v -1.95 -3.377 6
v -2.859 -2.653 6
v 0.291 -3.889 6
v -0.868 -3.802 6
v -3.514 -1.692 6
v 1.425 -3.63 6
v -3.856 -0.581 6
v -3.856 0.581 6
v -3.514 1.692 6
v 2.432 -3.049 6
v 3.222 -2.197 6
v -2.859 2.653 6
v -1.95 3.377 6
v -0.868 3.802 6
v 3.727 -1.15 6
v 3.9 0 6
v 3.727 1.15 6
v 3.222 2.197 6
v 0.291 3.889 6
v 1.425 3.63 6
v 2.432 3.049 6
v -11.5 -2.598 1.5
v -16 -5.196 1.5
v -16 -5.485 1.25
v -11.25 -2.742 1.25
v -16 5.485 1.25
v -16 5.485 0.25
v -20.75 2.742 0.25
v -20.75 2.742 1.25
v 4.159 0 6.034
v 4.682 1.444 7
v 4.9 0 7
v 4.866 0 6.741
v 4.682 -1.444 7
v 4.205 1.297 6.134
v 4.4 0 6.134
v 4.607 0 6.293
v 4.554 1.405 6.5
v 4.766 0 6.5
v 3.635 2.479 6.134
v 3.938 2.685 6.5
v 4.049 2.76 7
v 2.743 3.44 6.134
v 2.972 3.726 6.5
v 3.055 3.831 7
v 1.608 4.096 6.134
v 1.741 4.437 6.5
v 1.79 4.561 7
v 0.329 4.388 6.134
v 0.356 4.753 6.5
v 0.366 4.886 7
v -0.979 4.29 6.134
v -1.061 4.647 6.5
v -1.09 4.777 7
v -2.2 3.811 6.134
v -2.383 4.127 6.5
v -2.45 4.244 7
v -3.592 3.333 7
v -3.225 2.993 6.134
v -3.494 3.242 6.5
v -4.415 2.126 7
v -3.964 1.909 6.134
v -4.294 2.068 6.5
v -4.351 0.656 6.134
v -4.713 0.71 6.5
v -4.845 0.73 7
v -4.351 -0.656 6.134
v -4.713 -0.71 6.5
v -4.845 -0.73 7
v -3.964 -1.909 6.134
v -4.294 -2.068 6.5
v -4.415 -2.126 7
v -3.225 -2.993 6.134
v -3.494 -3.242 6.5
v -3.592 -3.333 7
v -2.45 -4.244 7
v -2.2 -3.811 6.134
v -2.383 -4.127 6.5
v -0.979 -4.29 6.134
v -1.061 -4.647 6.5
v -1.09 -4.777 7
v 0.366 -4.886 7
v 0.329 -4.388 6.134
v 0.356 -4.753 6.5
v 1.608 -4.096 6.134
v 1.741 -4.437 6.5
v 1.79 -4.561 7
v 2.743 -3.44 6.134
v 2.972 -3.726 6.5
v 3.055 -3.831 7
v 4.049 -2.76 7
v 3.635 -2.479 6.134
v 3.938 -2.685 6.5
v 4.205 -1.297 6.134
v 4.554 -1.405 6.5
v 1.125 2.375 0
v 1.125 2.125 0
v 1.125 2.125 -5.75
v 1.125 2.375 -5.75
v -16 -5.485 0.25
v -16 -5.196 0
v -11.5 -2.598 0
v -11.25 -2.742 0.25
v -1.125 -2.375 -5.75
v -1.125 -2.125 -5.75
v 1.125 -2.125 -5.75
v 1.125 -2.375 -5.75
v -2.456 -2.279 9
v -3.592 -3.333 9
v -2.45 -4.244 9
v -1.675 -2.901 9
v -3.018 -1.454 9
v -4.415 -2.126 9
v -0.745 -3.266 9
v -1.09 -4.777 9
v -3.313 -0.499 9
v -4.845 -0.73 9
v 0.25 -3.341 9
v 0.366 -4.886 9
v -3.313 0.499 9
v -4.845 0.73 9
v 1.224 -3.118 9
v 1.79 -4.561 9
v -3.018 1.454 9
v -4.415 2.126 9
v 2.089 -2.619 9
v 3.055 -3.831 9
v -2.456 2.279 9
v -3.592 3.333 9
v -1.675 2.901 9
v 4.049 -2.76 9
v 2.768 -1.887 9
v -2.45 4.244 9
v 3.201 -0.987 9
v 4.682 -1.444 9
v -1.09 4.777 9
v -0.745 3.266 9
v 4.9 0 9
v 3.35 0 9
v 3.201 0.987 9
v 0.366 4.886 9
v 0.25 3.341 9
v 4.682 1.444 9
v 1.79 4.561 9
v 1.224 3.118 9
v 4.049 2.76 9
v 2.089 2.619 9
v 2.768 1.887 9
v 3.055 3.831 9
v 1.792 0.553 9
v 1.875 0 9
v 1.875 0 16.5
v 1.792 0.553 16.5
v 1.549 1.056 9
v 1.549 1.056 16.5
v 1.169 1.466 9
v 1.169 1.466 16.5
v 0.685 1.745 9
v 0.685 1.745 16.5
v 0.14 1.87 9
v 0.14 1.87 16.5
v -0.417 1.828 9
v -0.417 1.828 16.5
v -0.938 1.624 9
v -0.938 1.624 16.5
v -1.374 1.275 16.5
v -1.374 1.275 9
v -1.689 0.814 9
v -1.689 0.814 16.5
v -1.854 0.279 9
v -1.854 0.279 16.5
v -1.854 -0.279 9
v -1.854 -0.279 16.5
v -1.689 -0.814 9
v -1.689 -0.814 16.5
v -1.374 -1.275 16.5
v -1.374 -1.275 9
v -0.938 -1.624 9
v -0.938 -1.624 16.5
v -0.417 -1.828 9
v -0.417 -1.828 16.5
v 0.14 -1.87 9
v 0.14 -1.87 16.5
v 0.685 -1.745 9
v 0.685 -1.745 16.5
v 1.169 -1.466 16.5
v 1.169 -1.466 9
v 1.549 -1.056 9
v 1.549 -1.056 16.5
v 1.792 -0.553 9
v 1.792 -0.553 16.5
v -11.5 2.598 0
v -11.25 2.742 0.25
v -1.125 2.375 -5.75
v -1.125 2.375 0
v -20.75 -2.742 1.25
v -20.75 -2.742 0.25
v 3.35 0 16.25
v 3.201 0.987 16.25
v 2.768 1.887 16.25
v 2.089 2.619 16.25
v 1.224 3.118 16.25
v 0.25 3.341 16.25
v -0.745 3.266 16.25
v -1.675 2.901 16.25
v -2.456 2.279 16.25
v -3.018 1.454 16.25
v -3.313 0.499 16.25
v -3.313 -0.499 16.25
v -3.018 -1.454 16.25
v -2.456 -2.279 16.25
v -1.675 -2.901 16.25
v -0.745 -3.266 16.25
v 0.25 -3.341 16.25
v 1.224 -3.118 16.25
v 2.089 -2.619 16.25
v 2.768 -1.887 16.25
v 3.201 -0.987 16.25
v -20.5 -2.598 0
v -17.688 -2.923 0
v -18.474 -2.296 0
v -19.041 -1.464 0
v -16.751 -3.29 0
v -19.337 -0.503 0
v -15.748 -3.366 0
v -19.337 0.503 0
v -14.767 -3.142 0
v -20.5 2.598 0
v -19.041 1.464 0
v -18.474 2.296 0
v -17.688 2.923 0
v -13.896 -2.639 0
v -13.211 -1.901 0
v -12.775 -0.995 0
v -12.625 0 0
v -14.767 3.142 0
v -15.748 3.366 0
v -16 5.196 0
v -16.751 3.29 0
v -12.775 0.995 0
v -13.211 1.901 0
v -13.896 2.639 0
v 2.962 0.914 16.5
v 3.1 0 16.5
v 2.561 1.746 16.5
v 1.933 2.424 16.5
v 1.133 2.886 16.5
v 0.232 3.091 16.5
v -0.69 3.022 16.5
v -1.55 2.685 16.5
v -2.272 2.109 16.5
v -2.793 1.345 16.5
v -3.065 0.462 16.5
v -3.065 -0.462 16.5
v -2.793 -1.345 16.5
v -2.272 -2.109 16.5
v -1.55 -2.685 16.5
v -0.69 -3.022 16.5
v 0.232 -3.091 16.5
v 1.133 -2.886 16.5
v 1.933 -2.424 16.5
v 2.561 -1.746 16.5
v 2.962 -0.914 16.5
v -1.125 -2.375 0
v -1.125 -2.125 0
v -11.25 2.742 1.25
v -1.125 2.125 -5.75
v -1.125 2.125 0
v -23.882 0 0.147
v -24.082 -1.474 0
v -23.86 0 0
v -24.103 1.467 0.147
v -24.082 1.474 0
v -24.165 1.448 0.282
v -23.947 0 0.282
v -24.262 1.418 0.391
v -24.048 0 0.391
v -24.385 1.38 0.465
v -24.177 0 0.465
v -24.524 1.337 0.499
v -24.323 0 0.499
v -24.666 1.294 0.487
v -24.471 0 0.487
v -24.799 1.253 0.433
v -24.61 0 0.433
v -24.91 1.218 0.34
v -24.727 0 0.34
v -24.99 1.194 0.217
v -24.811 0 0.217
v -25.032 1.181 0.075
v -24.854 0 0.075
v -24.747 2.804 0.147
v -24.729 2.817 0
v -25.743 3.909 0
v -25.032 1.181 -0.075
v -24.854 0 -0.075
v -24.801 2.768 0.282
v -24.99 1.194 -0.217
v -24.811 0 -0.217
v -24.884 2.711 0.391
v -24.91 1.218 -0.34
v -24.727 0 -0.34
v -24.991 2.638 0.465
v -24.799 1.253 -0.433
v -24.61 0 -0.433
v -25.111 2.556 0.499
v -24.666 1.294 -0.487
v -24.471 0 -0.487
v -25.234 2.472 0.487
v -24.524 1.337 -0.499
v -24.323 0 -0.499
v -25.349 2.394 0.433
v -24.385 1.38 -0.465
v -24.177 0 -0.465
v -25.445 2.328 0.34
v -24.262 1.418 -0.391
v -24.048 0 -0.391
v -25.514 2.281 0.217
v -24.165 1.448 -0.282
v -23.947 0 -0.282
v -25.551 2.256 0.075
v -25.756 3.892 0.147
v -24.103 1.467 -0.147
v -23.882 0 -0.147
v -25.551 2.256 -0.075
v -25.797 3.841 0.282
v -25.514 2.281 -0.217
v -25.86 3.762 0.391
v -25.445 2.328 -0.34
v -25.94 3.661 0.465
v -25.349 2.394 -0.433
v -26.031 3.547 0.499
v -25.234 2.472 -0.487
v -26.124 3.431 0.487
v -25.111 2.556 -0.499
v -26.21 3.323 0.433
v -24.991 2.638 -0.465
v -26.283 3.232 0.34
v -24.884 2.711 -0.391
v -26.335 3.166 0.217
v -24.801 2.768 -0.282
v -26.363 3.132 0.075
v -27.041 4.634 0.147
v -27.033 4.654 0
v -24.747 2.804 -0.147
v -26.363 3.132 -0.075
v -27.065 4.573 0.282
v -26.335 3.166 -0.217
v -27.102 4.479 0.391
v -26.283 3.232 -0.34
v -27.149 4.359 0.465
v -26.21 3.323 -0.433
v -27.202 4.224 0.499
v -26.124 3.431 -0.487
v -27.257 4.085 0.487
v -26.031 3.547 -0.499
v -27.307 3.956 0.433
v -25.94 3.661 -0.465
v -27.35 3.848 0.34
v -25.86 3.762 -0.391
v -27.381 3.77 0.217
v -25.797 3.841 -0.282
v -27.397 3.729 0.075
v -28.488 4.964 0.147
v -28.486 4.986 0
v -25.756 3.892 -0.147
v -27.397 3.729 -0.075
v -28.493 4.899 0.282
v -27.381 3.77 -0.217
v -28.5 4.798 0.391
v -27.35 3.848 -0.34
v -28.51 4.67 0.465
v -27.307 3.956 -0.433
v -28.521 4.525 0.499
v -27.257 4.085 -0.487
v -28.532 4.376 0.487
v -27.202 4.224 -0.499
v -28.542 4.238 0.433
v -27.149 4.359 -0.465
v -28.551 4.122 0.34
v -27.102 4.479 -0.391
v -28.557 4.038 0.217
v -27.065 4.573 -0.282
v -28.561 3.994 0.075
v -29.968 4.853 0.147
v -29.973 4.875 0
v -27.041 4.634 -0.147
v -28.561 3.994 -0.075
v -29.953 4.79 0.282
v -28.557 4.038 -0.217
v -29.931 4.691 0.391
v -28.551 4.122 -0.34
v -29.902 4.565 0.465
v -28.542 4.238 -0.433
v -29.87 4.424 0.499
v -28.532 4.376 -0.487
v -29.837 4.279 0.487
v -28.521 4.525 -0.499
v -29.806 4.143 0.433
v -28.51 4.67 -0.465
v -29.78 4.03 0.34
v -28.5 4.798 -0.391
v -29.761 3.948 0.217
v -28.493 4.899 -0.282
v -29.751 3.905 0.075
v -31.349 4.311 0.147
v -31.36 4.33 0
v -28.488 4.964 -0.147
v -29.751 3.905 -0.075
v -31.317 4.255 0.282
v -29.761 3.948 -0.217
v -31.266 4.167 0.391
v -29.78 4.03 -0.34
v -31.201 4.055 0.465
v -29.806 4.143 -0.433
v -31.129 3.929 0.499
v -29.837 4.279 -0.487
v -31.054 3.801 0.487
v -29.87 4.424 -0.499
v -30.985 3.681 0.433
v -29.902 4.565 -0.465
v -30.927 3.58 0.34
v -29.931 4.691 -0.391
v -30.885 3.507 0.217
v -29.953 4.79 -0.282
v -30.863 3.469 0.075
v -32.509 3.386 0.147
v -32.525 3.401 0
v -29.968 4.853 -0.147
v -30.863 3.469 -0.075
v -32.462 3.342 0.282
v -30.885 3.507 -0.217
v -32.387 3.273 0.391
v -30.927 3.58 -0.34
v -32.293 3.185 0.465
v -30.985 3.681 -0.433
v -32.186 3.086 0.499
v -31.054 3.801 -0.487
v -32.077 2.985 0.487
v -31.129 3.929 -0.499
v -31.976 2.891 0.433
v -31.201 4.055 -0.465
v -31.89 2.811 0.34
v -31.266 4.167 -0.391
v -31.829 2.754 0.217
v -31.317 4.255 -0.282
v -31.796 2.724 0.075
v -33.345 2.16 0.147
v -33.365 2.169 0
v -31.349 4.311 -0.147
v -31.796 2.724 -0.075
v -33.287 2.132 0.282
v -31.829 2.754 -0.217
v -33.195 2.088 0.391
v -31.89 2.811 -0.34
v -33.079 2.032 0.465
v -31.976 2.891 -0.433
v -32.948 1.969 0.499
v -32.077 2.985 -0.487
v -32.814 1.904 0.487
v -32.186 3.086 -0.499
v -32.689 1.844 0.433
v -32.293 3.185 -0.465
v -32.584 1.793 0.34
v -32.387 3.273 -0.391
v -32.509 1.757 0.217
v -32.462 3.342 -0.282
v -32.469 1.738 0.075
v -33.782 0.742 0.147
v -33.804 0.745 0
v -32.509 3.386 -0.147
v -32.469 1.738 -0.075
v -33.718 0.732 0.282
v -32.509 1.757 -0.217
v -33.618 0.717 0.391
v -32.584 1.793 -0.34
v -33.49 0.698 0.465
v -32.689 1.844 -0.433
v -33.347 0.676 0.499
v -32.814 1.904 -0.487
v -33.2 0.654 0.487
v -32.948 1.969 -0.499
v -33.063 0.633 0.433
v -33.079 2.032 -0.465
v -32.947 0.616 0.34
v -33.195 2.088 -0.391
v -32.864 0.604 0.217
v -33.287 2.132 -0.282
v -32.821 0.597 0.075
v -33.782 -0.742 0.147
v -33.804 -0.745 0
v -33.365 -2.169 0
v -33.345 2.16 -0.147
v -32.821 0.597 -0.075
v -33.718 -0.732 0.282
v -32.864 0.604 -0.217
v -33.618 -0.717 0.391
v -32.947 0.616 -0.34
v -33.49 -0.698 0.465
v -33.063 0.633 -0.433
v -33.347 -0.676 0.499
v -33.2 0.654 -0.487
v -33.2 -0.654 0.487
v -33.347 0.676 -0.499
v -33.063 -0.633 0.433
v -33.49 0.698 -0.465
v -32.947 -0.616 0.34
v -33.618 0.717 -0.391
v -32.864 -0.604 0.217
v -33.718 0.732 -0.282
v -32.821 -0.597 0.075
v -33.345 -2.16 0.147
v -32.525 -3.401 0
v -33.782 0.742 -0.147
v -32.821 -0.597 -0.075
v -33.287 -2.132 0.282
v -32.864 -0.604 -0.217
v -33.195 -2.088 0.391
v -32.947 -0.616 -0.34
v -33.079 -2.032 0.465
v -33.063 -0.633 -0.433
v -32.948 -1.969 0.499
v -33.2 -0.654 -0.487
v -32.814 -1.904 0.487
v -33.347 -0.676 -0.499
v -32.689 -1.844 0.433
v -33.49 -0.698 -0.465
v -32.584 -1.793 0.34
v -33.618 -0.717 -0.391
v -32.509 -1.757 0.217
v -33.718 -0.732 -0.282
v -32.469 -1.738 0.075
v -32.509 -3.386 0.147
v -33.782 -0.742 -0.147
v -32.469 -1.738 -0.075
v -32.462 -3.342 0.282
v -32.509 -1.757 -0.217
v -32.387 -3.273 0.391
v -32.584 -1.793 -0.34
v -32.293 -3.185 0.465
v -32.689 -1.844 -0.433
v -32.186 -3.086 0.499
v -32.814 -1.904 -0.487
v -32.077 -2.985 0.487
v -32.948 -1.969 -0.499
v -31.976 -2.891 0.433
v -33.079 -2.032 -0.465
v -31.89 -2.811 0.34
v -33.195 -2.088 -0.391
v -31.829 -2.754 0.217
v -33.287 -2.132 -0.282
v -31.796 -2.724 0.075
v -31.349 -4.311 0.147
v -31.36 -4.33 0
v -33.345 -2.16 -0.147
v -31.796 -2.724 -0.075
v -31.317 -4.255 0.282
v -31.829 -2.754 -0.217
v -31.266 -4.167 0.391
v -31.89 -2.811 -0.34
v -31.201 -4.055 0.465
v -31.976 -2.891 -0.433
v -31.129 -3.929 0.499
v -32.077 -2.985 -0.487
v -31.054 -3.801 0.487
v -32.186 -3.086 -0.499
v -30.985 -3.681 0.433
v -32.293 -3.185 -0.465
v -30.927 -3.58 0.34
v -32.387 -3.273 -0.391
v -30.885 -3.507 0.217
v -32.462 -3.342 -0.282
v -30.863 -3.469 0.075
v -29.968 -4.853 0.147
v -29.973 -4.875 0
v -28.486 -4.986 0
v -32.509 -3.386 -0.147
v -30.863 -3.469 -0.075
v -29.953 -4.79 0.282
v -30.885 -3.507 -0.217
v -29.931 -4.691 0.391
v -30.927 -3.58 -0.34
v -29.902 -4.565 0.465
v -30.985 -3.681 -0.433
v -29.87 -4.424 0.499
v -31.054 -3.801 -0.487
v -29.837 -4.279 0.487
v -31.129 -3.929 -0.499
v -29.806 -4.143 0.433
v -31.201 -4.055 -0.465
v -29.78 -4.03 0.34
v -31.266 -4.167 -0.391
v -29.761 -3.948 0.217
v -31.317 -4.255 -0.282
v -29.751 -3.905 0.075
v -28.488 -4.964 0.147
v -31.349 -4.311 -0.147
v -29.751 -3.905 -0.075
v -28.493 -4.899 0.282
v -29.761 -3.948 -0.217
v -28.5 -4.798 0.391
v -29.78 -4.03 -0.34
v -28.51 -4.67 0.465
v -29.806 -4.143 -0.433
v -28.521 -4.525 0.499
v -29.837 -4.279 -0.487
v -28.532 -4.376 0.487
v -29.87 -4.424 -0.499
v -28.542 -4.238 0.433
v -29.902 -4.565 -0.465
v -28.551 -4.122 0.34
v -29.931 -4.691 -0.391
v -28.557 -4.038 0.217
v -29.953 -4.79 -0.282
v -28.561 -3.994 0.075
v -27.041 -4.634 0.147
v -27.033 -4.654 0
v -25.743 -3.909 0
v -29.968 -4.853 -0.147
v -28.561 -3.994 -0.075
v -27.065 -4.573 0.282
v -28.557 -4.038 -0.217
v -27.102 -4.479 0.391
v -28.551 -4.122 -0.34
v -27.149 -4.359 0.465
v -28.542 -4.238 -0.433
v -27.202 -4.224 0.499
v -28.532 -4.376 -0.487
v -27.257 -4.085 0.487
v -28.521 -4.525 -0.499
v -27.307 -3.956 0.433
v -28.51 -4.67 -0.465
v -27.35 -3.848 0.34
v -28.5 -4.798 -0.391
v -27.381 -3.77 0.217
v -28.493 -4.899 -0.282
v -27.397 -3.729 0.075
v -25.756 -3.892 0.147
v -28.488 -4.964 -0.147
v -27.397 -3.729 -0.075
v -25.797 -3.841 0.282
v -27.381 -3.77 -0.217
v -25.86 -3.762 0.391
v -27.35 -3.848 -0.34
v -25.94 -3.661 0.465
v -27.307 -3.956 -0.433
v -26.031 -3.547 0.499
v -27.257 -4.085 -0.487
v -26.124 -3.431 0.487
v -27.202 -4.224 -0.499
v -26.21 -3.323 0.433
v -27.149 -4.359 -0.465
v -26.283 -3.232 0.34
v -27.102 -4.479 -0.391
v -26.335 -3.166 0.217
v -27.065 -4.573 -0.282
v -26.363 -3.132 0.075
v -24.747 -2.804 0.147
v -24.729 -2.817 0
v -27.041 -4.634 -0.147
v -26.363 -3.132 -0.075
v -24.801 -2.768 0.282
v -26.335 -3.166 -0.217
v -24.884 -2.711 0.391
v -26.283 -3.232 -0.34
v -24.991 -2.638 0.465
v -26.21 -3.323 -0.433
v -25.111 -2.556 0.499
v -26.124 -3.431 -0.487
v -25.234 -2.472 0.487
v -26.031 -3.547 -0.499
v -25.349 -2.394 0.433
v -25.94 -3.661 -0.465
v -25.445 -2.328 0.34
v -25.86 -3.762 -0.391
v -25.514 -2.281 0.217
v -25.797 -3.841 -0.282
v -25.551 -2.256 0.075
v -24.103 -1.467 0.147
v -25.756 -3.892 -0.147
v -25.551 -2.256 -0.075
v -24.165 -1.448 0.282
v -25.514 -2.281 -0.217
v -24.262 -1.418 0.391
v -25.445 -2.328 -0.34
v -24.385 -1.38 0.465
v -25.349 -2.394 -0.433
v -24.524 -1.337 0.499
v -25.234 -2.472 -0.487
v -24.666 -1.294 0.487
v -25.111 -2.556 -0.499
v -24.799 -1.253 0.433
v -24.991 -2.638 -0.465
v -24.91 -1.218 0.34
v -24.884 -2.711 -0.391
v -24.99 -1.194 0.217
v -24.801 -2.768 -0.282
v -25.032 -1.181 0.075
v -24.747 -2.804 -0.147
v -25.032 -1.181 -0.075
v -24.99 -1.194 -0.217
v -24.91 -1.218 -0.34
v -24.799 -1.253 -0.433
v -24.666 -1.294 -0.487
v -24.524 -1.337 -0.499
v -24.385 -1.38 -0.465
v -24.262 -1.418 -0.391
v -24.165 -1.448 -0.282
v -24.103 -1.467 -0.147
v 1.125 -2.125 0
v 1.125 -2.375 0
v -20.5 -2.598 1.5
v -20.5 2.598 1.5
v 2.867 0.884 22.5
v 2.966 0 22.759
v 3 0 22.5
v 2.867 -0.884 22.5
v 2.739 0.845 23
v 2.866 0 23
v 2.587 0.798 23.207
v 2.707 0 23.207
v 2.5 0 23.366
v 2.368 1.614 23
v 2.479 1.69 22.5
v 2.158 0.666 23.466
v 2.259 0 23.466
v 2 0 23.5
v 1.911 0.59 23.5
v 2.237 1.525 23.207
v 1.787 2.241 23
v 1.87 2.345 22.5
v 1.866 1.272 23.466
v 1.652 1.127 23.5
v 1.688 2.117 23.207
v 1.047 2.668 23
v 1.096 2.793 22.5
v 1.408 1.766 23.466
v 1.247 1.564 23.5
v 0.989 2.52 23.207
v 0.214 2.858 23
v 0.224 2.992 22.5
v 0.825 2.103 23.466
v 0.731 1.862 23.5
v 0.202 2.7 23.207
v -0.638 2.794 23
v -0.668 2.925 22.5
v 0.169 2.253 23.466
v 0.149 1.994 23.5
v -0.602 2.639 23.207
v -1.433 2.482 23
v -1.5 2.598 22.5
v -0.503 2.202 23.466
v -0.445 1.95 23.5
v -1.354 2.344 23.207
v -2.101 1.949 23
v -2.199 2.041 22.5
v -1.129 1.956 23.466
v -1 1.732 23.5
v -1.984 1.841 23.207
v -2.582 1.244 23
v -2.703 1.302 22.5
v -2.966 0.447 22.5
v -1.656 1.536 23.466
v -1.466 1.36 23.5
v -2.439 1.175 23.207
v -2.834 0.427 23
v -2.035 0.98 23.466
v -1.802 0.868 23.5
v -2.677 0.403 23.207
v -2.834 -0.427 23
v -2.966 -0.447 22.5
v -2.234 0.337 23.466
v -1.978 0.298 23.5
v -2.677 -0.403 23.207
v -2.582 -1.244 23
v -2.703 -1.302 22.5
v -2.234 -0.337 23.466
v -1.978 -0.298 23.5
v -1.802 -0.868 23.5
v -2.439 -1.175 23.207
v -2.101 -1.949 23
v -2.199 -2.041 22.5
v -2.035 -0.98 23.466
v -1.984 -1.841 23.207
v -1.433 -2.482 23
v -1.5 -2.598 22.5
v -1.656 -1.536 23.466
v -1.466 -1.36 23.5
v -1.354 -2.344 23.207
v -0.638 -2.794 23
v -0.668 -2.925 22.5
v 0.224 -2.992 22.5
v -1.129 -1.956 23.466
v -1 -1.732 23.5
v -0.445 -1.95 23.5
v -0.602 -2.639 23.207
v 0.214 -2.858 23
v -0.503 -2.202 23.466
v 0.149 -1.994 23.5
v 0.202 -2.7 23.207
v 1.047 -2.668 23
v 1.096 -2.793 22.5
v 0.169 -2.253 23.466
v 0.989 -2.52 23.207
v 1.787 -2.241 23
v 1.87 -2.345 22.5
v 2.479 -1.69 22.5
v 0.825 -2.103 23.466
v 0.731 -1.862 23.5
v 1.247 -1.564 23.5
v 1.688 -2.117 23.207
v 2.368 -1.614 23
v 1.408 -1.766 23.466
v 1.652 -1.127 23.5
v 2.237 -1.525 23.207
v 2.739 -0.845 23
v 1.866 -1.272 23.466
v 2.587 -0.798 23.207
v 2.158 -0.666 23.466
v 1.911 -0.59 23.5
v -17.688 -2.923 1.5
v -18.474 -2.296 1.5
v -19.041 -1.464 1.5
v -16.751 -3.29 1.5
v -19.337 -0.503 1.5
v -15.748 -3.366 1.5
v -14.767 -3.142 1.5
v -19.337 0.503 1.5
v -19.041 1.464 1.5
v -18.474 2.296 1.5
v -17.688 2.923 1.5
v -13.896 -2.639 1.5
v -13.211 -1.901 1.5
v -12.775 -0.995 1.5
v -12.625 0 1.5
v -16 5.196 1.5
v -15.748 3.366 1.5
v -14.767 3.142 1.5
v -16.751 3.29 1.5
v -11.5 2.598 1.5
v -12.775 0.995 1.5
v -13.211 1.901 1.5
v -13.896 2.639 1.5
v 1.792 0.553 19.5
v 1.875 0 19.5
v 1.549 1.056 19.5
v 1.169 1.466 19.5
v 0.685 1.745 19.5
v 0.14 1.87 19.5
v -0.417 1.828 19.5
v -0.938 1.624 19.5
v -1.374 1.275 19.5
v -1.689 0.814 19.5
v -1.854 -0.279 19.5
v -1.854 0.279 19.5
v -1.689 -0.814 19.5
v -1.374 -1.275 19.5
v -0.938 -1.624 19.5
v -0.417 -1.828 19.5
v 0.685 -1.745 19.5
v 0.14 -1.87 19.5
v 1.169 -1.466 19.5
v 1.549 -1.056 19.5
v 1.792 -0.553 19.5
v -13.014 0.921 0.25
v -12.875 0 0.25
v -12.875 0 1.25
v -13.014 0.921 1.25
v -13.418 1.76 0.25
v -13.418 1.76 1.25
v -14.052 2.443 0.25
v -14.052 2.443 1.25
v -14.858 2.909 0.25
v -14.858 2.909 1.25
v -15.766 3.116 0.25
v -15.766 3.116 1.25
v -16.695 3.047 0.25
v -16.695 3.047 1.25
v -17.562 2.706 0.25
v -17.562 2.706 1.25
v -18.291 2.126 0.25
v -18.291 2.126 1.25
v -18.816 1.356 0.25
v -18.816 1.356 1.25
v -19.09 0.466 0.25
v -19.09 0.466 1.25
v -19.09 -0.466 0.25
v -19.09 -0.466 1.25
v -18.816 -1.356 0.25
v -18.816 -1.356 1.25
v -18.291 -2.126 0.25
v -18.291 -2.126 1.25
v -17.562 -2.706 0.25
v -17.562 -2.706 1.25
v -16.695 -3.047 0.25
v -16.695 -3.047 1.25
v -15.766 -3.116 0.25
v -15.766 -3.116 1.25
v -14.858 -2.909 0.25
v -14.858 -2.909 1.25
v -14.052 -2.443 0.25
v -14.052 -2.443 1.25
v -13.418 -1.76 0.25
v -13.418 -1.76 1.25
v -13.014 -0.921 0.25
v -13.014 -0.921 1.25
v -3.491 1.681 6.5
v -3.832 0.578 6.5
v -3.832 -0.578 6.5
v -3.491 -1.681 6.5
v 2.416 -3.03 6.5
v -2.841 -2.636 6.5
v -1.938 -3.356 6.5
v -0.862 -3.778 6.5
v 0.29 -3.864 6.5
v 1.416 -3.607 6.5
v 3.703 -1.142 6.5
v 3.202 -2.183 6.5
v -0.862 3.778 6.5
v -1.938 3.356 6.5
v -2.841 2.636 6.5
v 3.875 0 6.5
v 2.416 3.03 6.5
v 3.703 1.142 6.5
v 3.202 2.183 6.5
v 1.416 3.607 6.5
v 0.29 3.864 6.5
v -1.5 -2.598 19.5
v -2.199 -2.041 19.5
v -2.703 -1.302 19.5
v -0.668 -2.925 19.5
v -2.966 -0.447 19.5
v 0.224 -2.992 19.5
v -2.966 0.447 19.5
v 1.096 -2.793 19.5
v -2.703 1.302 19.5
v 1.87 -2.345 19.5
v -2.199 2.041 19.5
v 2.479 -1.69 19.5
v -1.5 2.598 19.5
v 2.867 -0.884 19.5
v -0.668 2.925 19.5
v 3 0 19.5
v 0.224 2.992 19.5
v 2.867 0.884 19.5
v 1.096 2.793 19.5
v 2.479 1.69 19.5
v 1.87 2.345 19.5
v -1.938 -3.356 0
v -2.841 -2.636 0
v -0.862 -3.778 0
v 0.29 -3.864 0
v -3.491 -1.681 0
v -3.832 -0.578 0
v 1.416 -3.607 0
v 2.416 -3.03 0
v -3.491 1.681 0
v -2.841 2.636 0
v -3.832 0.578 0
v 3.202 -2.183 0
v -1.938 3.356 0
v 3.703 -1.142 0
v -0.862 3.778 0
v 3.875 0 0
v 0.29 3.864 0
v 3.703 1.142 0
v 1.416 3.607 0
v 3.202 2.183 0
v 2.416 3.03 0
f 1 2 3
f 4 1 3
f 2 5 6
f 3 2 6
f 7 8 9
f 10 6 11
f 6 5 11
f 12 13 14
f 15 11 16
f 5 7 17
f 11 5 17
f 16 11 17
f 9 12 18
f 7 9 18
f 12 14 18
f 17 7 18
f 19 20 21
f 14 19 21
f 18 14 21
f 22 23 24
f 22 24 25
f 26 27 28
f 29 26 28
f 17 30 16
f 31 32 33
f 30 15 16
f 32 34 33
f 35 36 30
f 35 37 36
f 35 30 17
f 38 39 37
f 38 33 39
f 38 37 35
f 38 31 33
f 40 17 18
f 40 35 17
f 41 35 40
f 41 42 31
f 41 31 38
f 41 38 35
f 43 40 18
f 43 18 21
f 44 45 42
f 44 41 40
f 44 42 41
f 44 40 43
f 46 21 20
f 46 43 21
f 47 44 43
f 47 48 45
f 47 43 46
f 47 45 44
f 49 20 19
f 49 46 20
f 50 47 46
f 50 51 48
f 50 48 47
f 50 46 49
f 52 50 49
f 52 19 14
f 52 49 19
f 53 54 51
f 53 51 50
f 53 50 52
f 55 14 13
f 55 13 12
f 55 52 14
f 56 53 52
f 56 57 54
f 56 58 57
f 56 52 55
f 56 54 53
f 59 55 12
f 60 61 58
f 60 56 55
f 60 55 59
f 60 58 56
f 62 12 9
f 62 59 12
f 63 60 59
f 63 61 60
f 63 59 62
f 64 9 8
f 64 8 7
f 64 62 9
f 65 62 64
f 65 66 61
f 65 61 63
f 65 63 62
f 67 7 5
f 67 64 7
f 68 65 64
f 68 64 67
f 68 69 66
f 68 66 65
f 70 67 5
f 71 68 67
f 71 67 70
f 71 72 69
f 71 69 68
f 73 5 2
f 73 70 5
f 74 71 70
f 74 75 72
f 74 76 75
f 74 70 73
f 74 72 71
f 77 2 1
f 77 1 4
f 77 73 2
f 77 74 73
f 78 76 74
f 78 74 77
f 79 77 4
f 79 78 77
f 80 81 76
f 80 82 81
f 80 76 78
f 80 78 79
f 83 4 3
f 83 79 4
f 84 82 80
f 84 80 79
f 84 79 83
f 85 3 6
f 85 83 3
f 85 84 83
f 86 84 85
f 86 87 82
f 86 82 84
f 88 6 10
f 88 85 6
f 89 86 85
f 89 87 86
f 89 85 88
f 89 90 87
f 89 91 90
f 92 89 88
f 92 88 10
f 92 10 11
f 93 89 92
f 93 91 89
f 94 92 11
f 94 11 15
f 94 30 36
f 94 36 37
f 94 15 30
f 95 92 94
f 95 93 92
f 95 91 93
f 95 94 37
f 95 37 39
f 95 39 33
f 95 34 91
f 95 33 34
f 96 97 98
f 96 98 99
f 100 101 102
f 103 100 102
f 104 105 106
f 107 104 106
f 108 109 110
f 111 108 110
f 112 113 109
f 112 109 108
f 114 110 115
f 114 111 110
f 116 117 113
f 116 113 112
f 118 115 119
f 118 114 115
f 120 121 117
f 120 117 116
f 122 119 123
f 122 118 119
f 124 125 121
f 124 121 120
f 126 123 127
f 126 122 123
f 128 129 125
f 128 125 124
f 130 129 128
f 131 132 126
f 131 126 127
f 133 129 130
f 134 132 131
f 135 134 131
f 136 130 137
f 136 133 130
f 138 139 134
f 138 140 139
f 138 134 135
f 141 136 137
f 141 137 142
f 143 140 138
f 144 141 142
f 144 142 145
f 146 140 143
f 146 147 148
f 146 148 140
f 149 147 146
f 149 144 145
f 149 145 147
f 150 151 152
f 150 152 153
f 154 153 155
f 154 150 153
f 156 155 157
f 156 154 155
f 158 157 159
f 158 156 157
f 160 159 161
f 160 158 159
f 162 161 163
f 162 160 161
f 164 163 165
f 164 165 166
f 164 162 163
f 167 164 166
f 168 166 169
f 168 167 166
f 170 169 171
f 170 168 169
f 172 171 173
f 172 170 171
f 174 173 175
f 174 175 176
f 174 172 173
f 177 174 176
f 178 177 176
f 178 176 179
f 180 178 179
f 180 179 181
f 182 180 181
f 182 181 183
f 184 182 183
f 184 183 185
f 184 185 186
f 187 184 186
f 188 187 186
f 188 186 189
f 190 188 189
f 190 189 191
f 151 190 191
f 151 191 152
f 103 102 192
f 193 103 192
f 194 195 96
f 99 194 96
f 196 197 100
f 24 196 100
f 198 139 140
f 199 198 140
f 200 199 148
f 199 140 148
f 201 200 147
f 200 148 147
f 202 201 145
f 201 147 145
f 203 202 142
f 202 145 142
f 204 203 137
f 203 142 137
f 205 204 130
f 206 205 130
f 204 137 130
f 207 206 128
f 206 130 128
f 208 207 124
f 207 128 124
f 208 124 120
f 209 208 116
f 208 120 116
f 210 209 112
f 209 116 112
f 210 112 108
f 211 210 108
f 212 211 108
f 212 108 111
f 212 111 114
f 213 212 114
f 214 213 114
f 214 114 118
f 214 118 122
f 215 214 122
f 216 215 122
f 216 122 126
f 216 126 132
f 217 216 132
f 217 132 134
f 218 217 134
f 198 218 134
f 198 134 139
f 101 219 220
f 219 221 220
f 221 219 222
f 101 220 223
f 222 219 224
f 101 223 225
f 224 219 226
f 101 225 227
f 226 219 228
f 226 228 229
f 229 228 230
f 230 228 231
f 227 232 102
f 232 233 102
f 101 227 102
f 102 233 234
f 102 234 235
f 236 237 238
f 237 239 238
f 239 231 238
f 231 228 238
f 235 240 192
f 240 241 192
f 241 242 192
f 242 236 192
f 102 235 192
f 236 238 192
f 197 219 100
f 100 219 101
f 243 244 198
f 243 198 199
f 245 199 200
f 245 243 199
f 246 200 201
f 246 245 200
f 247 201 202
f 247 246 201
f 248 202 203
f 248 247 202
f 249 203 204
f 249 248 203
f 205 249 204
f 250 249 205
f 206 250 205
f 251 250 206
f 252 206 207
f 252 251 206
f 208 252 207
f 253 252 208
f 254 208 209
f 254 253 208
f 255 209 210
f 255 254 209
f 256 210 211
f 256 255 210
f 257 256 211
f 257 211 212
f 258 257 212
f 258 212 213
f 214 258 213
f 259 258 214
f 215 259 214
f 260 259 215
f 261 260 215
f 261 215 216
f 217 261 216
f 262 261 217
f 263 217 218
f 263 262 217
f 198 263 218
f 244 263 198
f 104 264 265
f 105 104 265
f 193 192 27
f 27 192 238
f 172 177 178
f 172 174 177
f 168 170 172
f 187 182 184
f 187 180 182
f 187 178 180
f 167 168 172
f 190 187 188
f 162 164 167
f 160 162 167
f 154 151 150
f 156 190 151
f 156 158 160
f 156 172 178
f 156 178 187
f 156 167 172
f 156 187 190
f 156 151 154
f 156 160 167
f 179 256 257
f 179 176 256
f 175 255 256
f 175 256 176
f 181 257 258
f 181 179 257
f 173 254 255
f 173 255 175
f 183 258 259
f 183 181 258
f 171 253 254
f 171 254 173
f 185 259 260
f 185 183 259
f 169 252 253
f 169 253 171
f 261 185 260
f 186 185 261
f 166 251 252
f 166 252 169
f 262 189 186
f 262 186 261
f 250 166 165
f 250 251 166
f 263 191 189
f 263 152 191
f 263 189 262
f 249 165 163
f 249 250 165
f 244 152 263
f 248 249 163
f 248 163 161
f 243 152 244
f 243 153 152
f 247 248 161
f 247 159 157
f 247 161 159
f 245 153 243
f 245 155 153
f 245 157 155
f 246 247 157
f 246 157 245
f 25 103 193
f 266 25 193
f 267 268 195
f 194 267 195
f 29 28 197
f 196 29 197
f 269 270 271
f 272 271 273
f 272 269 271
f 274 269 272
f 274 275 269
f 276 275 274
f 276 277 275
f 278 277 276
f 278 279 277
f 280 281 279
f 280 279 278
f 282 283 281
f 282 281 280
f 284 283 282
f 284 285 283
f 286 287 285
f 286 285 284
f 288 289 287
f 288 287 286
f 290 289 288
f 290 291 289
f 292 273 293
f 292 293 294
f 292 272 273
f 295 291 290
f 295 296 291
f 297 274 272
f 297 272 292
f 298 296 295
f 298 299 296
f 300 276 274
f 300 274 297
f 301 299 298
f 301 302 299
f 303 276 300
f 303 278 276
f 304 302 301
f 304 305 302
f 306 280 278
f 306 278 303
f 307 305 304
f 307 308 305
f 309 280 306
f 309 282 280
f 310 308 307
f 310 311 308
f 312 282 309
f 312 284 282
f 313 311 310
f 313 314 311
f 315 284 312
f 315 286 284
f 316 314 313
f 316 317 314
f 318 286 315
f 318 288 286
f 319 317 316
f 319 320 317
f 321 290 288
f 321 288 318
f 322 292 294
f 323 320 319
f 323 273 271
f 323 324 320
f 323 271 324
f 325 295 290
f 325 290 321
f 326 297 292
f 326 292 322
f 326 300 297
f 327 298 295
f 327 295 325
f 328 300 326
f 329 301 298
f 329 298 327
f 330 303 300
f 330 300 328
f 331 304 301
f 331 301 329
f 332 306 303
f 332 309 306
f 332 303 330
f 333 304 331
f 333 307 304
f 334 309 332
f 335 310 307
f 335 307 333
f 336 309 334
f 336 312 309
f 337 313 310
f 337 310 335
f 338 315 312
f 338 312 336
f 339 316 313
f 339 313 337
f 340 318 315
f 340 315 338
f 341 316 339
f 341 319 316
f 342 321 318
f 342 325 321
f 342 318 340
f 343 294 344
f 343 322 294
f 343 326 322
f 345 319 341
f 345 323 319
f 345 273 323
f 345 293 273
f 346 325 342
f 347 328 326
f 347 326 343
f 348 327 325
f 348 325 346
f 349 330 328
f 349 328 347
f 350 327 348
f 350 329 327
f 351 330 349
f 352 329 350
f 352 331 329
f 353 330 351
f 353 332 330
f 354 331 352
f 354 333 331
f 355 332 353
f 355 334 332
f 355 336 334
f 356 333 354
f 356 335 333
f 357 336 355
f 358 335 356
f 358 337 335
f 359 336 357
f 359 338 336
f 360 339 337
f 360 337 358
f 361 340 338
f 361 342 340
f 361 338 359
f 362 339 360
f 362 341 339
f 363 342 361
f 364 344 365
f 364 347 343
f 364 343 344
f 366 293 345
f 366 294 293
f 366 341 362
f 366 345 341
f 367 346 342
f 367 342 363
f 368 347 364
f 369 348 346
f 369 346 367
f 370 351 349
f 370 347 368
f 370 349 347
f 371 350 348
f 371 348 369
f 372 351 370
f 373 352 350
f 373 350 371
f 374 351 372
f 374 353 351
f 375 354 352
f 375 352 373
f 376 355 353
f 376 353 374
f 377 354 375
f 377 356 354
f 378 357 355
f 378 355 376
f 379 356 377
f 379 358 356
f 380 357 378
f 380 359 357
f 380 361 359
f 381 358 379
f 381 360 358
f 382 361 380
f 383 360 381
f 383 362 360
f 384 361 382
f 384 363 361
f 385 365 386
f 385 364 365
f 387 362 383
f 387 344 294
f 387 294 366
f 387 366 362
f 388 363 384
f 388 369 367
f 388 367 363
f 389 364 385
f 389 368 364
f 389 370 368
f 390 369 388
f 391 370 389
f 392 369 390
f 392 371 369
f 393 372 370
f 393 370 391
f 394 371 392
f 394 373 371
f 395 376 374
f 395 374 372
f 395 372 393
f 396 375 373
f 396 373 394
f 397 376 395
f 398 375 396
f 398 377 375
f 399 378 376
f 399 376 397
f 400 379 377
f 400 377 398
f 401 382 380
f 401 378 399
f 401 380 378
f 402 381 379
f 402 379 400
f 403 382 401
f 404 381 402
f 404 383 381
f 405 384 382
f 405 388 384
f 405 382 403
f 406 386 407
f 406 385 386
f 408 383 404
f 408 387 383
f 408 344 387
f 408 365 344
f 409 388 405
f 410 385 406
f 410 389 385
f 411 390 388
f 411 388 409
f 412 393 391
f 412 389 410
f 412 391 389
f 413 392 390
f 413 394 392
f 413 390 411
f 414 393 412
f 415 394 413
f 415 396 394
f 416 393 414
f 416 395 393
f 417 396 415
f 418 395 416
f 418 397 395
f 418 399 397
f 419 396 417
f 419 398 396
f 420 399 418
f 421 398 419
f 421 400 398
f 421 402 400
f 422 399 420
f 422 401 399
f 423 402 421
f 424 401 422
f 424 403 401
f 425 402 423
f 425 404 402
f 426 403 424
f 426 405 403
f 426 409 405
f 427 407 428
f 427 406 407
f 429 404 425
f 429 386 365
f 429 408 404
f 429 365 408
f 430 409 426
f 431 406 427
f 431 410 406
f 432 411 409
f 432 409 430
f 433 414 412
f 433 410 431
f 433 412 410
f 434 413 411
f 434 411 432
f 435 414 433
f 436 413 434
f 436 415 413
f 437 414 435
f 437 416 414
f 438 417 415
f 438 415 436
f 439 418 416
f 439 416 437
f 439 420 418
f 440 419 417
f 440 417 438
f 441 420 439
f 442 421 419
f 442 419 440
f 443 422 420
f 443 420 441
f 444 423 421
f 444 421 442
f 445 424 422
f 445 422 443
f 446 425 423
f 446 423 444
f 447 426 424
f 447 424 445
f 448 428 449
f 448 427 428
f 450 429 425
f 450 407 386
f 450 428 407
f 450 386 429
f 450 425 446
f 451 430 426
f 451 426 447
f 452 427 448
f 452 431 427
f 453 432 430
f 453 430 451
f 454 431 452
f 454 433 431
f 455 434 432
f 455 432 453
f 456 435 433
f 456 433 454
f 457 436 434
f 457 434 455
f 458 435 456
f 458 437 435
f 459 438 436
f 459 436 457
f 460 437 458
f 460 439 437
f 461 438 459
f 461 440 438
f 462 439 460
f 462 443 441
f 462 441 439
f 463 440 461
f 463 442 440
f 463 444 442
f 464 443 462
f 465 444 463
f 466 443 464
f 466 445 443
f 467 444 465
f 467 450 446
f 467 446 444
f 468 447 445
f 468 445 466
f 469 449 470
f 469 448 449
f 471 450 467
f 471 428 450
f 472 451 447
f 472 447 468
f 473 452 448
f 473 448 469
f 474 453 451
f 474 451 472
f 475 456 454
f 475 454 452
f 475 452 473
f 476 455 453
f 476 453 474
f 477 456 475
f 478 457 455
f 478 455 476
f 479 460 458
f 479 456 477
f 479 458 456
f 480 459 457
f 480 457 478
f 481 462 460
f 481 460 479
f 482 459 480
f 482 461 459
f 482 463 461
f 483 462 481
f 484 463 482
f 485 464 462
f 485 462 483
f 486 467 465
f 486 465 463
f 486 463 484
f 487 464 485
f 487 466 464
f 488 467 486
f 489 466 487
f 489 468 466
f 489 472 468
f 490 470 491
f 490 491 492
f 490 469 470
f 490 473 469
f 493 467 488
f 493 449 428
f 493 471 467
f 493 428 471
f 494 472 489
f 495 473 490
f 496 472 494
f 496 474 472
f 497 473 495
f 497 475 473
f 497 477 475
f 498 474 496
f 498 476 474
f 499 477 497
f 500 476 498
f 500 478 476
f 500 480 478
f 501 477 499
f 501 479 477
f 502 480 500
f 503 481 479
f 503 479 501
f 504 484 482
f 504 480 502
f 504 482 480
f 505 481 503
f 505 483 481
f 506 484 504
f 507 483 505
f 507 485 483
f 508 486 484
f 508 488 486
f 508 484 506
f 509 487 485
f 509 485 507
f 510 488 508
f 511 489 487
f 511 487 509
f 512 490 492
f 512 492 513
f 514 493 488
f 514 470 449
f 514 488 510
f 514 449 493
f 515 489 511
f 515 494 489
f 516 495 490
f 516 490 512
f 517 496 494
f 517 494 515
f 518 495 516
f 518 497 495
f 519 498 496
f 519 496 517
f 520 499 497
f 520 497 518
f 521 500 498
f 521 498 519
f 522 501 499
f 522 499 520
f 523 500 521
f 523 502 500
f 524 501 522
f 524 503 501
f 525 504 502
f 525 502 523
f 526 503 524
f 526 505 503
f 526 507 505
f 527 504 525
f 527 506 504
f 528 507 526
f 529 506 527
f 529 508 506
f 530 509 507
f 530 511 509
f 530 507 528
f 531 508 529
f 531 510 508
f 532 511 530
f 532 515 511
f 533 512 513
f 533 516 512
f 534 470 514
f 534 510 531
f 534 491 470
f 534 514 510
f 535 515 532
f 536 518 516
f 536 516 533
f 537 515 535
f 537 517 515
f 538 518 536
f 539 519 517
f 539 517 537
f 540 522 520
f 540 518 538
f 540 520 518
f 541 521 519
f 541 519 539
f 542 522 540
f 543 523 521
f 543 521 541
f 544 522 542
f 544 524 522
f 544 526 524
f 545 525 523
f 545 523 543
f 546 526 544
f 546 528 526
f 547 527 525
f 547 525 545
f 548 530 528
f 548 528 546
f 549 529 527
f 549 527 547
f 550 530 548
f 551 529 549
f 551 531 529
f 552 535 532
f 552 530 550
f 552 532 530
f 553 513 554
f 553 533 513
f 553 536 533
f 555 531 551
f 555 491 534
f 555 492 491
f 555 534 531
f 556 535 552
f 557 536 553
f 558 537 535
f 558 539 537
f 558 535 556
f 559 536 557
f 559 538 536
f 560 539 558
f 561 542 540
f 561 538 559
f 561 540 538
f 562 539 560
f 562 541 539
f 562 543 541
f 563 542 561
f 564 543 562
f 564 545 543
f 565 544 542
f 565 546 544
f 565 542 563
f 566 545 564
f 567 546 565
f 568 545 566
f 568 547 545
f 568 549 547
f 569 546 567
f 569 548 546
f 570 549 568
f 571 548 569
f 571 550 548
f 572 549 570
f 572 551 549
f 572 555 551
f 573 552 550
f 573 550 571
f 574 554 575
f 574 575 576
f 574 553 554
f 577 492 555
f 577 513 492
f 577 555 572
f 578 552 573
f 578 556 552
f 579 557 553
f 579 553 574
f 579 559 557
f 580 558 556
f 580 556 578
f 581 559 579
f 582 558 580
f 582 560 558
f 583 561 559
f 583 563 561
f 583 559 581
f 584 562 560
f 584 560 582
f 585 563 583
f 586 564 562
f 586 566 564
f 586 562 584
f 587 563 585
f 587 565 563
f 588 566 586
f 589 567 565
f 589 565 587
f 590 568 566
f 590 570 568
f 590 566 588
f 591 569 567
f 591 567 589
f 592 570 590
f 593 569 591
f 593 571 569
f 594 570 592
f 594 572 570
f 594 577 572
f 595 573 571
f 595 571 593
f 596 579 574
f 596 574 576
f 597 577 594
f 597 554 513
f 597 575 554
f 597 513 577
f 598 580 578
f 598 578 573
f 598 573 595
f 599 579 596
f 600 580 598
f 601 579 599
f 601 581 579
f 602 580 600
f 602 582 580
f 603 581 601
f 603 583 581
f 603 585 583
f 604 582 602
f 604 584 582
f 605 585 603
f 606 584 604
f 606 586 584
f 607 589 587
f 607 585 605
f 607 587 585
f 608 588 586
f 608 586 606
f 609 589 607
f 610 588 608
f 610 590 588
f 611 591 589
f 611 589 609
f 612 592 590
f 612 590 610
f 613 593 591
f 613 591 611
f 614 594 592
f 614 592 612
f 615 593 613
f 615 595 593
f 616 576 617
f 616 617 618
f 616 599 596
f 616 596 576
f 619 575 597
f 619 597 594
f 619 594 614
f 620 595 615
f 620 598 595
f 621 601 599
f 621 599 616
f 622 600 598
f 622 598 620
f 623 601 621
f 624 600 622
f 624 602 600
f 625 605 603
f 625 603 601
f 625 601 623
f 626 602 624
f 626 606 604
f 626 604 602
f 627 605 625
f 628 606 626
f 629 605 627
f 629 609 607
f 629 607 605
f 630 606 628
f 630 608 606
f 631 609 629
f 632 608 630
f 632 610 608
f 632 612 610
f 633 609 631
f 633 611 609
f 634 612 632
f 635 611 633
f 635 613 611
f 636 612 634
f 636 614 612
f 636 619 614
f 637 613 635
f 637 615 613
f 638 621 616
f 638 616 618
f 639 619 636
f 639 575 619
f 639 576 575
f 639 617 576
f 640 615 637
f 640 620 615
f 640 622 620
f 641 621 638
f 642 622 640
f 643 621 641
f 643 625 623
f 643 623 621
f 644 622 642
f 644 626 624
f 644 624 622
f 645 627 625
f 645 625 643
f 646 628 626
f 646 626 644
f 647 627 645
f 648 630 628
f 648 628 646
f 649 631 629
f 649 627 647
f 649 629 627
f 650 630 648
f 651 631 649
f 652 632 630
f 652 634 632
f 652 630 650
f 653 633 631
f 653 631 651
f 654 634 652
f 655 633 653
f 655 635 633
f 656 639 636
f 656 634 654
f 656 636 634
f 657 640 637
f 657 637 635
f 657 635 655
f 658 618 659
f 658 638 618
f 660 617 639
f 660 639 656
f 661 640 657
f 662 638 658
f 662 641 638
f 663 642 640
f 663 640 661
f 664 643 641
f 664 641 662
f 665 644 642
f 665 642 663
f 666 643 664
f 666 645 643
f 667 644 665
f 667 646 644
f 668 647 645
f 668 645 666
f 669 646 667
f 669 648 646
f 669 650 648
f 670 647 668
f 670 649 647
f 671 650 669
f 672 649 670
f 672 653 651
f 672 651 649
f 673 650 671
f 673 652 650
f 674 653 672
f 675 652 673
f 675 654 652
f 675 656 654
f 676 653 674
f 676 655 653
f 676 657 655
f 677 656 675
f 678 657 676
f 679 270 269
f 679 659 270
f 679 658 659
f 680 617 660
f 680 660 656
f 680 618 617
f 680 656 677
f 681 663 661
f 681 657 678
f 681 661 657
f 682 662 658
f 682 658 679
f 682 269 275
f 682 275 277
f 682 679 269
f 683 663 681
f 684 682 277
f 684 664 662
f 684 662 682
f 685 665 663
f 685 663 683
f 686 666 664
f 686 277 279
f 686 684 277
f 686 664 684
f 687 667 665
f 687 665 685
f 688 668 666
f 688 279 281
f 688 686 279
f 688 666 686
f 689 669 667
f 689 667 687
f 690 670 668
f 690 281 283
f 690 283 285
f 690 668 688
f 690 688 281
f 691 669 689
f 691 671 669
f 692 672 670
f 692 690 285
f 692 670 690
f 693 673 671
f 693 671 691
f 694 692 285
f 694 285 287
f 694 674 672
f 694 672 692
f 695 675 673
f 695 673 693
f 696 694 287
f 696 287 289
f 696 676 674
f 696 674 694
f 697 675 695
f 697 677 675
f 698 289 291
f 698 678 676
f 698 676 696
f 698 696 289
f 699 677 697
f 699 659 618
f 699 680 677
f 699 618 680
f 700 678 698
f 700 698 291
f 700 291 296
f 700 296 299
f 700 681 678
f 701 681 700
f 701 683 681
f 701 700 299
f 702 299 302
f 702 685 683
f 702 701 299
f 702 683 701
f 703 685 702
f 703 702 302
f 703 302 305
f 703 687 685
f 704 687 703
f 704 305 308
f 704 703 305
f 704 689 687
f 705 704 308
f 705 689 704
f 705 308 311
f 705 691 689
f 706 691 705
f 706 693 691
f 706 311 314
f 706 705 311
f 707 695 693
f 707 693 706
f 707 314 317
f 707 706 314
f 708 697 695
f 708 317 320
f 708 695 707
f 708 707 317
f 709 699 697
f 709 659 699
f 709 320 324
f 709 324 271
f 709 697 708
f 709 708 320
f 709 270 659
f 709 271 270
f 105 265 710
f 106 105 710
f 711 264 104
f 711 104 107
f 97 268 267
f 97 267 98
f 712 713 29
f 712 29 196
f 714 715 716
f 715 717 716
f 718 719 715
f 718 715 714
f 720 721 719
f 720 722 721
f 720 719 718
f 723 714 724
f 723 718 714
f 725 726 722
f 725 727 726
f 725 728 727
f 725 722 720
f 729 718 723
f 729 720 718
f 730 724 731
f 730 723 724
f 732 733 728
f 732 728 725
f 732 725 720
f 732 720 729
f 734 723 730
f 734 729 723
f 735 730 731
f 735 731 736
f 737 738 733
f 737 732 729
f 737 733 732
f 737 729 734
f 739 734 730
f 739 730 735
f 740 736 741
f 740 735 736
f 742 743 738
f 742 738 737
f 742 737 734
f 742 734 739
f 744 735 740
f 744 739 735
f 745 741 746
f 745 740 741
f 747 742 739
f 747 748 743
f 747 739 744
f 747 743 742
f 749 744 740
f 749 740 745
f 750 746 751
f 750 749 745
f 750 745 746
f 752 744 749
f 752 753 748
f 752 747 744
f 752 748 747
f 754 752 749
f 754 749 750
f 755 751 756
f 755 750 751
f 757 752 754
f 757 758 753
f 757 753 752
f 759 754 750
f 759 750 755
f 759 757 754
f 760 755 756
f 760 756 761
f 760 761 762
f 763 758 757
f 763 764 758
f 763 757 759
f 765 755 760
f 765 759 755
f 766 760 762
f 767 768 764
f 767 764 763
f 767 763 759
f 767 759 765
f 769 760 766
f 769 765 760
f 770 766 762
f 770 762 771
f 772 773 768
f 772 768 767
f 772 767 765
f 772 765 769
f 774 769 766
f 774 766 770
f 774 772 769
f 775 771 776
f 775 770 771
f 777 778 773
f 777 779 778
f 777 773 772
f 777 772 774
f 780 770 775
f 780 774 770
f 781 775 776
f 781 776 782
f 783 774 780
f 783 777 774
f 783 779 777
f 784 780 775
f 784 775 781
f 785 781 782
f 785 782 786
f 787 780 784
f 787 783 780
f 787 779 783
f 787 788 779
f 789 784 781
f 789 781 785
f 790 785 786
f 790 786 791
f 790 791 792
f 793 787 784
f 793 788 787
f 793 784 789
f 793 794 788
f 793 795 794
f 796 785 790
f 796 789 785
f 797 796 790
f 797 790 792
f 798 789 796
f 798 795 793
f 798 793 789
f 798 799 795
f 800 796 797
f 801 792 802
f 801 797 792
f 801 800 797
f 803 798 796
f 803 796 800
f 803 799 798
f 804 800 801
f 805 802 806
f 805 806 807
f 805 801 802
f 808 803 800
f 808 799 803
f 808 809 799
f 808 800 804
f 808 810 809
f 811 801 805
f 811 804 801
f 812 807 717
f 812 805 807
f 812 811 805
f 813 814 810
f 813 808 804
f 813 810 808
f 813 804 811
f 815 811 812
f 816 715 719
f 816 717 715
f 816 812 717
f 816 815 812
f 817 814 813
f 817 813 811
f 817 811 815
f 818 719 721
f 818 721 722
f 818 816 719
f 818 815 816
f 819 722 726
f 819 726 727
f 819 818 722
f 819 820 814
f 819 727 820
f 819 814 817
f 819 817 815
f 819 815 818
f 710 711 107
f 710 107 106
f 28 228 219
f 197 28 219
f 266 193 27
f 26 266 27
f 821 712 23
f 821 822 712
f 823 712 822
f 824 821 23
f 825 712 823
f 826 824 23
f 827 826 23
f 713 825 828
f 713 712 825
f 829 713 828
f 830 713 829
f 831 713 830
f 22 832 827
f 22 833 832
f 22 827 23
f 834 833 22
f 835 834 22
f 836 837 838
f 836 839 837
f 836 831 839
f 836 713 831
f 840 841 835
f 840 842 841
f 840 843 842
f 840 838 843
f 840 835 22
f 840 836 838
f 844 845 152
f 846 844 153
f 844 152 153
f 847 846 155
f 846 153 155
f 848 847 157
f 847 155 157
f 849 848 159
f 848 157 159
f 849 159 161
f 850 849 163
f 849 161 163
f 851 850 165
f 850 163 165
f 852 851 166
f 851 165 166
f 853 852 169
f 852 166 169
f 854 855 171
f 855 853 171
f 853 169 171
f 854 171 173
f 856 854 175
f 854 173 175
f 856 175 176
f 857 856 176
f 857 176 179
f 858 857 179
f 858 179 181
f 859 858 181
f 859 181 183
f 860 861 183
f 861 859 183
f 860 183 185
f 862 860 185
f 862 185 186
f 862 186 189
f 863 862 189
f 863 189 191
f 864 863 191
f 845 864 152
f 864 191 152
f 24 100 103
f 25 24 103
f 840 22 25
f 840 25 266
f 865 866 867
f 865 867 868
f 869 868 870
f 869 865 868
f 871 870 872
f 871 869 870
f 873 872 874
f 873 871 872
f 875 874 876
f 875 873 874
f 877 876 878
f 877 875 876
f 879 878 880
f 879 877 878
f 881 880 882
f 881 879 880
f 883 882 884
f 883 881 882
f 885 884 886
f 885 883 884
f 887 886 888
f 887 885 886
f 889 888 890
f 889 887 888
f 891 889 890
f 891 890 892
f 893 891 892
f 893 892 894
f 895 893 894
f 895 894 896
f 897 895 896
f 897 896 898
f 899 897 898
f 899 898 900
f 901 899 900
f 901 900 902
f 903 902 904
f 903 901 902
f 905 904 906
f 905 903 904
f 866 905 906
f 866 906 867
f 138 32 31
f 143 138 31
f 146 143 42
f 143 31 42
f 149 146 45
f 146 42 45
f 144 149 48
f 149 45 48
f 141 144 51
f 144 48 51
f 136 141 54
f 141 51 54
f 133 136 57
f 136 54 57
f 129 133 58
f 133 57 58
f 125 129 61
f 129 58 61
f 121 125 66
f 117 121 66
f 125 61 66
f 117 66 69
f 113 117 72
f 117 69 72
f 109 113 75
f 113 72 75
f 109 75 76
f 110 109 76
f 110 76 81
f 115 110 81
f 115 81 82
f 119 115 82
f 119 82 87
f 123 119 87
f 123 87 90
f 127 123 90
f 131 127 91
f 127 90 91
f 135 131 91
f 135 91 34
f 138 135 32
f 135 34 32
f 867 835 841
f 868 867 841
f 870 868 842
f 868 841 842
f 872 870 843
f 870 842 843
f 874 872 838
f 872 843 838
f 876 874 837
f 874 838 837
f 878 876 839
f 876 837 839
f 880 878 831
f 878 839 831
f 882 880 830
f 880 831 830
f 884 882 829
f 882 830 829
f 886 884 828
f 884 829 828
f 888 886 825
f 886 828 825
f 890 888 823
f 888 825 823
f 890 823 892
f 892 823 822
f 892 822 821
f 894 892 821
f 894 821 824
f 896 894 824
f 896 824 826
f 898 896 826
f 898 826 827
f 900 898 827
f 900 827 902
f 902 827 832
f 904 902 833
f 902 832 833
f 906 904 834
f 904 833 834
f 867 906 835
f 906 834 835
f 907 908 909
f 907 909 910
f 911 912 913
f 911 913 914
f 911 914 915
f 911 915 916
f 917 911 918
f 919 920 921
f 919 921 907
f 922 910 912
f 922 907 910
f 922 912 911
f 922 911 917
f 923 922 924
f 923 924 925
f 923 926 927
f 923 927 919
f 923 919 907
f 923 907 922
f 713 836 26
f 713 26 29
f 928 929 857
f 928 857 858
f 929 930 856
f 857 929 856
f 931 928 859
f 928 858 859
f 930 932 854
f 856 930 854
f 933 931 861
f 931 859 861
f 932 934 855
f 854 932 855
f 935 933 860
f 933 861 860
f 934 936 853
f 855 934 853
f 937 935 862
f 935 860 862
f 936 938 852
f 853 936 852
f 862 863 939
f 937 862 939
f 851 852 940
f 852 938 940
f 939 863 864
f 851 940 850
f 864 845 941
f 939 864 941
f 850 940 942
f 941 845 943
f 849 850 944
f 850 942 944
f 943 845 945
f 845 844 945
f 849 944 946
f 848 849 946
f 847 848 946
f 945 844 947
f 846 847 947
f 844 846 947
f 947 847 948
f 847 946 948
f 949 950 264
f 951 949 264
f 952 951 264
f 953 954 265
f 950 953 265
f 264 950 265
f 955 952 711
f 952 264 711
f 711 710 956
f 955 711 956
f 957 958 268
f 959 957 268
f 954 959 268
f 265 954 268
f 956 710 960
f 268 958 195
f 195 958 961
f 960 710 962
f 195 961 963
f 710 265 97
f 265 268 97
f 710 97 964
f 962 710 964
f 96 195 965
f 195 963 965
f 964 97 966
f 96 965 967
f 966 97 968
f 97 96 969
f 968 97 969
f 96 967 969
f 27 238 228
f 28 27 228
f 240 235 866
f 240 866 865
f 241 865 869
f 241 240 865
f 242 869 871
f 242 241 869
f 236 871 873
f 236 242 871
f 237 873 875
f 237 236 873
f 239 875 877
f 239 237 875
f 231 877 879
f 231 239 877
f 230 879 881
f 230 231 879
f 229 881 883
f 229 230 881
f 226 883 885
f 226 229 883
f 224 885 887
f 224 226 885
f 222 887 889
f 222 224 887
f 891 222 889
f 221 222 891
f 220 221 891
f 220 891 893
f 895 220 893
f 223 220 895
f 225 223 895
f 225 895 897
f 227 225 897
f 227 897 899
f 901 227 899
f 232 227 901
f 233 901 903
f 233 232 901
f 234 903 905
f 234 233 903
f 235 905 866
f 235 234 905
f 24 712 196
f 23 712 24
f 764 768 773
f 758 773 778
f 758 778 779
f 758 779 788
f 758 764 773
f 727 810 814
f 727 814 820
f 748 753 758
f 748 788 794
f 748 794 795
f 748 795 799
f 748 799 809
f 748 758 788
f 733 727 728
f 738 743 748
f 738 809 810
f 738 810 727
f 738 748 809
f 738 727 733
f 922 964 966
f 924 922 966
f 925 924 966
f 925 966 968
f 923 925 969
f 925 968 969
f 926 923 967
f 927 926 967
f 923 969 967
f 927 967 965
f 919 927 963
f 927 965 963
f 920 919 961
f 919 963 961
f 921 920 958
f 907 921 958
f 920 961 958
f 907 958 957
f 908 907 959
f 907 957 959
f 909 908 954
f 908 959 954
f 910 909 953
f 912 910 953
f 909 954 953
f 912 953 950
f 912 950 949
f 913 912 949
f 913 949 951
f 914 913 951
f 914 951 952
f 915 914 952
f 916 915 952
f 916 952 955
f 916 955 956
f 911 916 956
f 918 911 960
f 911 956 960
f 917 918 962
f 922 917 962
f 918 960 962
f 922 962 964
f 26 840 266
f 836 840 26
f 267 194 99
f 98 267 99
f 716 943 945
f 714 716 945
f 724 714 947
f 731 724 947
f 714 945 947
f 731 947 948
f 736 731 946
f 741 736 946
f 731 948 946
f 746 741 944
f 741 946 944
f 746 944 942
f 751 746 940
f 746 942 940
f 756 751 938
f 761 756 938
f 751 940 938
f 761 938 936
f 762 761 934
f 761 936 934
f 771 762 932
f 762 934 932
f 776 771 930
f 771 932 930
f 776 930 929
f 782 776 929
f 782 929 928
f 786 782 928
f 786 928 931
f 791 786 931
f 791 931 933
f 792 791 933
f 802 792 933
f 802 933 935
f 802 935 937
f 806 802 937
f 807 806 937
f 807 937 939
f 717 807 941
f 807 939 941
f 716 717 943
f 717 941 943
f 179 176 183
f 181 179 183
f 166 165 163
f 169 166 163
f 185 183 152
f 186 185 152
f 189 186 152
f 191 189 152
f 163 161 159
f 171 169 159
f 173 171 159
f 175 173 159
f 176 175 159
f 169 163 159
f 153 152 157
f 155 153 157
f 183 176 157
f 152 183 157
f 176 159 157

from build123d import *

# Parameters (mm, degrees)
F0_R      = 3.875
F0_R_2    = 3.35
F0_R_3    = 3
F0_W      = 2.25
F0_H      = 0.25
F0_R_4    = 1.875
F1_DEPTH  = 6.5
F2_START  = 6
F0_R_5    = 4.9
F2_DEPTH  = 3
F3_START  = 6
F3_DEPTH  = 10.5
F4_START  = 16.5
F4_DEPTH  = 7
F5_START  = 19.5
F5_DEPTH  = 4
F6_R      = 1
F7_R      = 1
F8_SIZE   = 0.25
F9_DEPTH  = 5.75
F10_R     = 3.125
F11_DEPTH = 1.5
F12_SIZE  = 0.25
F13_R     = 0.5


with BuildPart() as f1:
    # F0 (on Top) → F1 (new body)
    with BuildSketch(Plane.XY):
        Circle(F0_R)
        Circle(F0_R_2, mode=Mode.SUBTRACT)
        Circle(F0_R_2)
        Circle(F0_R_3, mode=Mode.SUBTRACT)
        Circle(F0_R_3)
        with Locations((0, -2.25)):
            Rectangle(F0_W, F0_H, mode=Mode.SUBTRACT)
        Circle(F0_R_4, mode=Mode.SUBTRACT)
        with Locations((0, 2.25)):
            Rectangle(F0_W, F0_H, mode=Mode.SUBTRACT)
        Circle(F0_R_4)
        with Locations((0, 2.25)):
            Rectangle(F0_W, F0_H)
        with Locations((0, -2.25)):
            Rectangle(F0_W, F0_H)
    extrude(amount=F1_DEPTH)

    # F0 (on Top) → F9 (join)
    with BuildSketch(Plane.XY):
        with Locations((0, 2.25)):
            Rectangle(F0_W, F0_H)
        with Locations((0, -2.25)):
            Rectangle(F0_W, F0_H)
    extrude(amount=-F9_DEPTH)


with BuildPart() as f2:
    # F0 (on Top) → F2 (new body)
    with BuildSketch(Plane.XY.offset(F2_START)):
        Circle(F0_R_5)
        Circle(F0_R, mode=Mode.SUBTRACT)
        Circle(F0_R)
        Circle(F0_R_2, mode=Mode.SUBTRACT)
        Circle(F0_R_2)
        Circle(F0_R_3, mode=Mode.SUBTRACT)
        Circle(F0_R_3)
        with Locations((0, -2.25)):
            Rectangle(F0_W, F0_H, mode=Mode.SUBTRACT)
        Circle(F0_R_4, mode=Mode.SUBTRACT)
        with Locations((0, 2.25)):
            Rectangle(F0_W, F0_H, mode=Mode.SUBTRACT)
        Circle(F0_R_4)
    extrude(amount=F2_DEPTH)

    # F0 (on Top) → F3 (join)
    with BuildSketch(Plane.XY.offset(F3_START)):
        Circle(F0_R_2)
        Circle(F0_R_3, mode=Mode.SUBTRACT)
        Circle(F0_R_3)
        with Locations((0, -2.25)):
            Rectangle(F0_W, F0_H, mode=Mode.SUBTRACT)
        Circle(F0_R_4, mode=Mode.SUBTRACT)
        with Locations((0, 2.25)):
            Rectangle(F0_W, F0_H, mode=Mode.SUBTRACT)
        with Locations((0, 2.25)):
            Rectangle(F0_W, F0_H)
        with Locations((0, -2.25)):
            Rectangle(F0_W, F0_H)
    extrude(amount=F3_DEPTH)

    # F7
    f7_edges = [f2.edges().sort_by_distance(p)[0] for p in [
        (-4.9, 0, 6),
    ]]
    fillet(f7_edges, radius=F7_R)

    # F8
    f8_edges = [f2.edges().sort_by_distance(p)[0] for p in [
        (-3.35, 0, 16.5),
    ]]
    chamfer(f8_edges, length=F8_SIZE)


with BuildPart() as f4:
    # F0 (on Top) → F4 (new body)
    with BuildSketch(Plane.XY.offset(F4_START)):
        Circle(F0_R_4)
    extrude(amount=F4_DEPTH)

    # F0 (on Top) → F5 (join)
    with BuildSketch(Plane.XY.offset(F5_START)):
        Circle(F0_R_3)
        with Locations((0, -2.25)):
            Rectangle(F0_W, F0_H, mode=Mode.SUBTRACT)
        Circle(F0_R_4, mode=Mode.SUBTRACT)
        with Locations((0, 2.25)):
            Rectangle(F0_W, F0_H, mode=Mode.SUBTRACT)
        Circle(F0_R_4)
        with Locations((0, -2.25)):
            Rectangle(F0_W, F0_H)
        with Locations((0, 2.25)):
            Rectangle(F0_W, F0_H)
    extrude(amount=F5_DEPTH)

    # F6
    f6_edges = [f4.edges().sort_by_distance(p)[0] for p in [
        (-3, 0, 23.5),
    ]]
    fillet(f6_edges, radius=F6_R)


with BuildPart() as f11:
    # F10 (on Top) → F11 (new body)
    with BuildSketch(Plane.XY):
        Polygon((-20.75, 2.7424137787), (-20.75, -2.7424137787), (-16, -5.4848275573), (-11.25, -2.7424137787), (-11.25, 2.7424137787), (-16, 5.4848275573), align=None)
        with Locations((-16, 0)):
            Circle(F10_R, mode=Mode.SUBTRACT)
    extrude(amount=F11_DEPTH)

    # F12
    f12_edges = [f11.edges().sort_by_distance(p)[0] for p in [
        (-20.75, 0, 1.5),
        (-18.375, -4.113621, 1.5),
        (-13.625, -4.113621, 1.5),
        (-11.25, 0, 1.5),
        (-13.625, 4.113621, 1.5),
        (-18.375, 4.113621, 1.5),
        (-19.125, 0, 1.5),
        (-20.75, 0, 0),
        (-18.375, -4.113621, 0),
        (-13.625, -4.113621, 0),
        (-11.25, 0, 0),
        (-13.625, 4.113621, 0),
        (-18.375, 4.113621, 0),
        (-19.125, 0, 0),
    ]]
    chamfer(f12_edges, length=F12_SIZE)


with BuildPart() as f15:
    # F13 (on Front) → F15 (revolve)
    with BuildSketch(Plane.XZ):
        with Locations((-24.3600804166, 0)):
            Circle(F13_R)
    revolve(axis=Axis((-28.8600804166, 0, 0), (0, 0, 1)))


solid = Compound([f1.part, f2.part, f4.part, f11.part, f15.part])
